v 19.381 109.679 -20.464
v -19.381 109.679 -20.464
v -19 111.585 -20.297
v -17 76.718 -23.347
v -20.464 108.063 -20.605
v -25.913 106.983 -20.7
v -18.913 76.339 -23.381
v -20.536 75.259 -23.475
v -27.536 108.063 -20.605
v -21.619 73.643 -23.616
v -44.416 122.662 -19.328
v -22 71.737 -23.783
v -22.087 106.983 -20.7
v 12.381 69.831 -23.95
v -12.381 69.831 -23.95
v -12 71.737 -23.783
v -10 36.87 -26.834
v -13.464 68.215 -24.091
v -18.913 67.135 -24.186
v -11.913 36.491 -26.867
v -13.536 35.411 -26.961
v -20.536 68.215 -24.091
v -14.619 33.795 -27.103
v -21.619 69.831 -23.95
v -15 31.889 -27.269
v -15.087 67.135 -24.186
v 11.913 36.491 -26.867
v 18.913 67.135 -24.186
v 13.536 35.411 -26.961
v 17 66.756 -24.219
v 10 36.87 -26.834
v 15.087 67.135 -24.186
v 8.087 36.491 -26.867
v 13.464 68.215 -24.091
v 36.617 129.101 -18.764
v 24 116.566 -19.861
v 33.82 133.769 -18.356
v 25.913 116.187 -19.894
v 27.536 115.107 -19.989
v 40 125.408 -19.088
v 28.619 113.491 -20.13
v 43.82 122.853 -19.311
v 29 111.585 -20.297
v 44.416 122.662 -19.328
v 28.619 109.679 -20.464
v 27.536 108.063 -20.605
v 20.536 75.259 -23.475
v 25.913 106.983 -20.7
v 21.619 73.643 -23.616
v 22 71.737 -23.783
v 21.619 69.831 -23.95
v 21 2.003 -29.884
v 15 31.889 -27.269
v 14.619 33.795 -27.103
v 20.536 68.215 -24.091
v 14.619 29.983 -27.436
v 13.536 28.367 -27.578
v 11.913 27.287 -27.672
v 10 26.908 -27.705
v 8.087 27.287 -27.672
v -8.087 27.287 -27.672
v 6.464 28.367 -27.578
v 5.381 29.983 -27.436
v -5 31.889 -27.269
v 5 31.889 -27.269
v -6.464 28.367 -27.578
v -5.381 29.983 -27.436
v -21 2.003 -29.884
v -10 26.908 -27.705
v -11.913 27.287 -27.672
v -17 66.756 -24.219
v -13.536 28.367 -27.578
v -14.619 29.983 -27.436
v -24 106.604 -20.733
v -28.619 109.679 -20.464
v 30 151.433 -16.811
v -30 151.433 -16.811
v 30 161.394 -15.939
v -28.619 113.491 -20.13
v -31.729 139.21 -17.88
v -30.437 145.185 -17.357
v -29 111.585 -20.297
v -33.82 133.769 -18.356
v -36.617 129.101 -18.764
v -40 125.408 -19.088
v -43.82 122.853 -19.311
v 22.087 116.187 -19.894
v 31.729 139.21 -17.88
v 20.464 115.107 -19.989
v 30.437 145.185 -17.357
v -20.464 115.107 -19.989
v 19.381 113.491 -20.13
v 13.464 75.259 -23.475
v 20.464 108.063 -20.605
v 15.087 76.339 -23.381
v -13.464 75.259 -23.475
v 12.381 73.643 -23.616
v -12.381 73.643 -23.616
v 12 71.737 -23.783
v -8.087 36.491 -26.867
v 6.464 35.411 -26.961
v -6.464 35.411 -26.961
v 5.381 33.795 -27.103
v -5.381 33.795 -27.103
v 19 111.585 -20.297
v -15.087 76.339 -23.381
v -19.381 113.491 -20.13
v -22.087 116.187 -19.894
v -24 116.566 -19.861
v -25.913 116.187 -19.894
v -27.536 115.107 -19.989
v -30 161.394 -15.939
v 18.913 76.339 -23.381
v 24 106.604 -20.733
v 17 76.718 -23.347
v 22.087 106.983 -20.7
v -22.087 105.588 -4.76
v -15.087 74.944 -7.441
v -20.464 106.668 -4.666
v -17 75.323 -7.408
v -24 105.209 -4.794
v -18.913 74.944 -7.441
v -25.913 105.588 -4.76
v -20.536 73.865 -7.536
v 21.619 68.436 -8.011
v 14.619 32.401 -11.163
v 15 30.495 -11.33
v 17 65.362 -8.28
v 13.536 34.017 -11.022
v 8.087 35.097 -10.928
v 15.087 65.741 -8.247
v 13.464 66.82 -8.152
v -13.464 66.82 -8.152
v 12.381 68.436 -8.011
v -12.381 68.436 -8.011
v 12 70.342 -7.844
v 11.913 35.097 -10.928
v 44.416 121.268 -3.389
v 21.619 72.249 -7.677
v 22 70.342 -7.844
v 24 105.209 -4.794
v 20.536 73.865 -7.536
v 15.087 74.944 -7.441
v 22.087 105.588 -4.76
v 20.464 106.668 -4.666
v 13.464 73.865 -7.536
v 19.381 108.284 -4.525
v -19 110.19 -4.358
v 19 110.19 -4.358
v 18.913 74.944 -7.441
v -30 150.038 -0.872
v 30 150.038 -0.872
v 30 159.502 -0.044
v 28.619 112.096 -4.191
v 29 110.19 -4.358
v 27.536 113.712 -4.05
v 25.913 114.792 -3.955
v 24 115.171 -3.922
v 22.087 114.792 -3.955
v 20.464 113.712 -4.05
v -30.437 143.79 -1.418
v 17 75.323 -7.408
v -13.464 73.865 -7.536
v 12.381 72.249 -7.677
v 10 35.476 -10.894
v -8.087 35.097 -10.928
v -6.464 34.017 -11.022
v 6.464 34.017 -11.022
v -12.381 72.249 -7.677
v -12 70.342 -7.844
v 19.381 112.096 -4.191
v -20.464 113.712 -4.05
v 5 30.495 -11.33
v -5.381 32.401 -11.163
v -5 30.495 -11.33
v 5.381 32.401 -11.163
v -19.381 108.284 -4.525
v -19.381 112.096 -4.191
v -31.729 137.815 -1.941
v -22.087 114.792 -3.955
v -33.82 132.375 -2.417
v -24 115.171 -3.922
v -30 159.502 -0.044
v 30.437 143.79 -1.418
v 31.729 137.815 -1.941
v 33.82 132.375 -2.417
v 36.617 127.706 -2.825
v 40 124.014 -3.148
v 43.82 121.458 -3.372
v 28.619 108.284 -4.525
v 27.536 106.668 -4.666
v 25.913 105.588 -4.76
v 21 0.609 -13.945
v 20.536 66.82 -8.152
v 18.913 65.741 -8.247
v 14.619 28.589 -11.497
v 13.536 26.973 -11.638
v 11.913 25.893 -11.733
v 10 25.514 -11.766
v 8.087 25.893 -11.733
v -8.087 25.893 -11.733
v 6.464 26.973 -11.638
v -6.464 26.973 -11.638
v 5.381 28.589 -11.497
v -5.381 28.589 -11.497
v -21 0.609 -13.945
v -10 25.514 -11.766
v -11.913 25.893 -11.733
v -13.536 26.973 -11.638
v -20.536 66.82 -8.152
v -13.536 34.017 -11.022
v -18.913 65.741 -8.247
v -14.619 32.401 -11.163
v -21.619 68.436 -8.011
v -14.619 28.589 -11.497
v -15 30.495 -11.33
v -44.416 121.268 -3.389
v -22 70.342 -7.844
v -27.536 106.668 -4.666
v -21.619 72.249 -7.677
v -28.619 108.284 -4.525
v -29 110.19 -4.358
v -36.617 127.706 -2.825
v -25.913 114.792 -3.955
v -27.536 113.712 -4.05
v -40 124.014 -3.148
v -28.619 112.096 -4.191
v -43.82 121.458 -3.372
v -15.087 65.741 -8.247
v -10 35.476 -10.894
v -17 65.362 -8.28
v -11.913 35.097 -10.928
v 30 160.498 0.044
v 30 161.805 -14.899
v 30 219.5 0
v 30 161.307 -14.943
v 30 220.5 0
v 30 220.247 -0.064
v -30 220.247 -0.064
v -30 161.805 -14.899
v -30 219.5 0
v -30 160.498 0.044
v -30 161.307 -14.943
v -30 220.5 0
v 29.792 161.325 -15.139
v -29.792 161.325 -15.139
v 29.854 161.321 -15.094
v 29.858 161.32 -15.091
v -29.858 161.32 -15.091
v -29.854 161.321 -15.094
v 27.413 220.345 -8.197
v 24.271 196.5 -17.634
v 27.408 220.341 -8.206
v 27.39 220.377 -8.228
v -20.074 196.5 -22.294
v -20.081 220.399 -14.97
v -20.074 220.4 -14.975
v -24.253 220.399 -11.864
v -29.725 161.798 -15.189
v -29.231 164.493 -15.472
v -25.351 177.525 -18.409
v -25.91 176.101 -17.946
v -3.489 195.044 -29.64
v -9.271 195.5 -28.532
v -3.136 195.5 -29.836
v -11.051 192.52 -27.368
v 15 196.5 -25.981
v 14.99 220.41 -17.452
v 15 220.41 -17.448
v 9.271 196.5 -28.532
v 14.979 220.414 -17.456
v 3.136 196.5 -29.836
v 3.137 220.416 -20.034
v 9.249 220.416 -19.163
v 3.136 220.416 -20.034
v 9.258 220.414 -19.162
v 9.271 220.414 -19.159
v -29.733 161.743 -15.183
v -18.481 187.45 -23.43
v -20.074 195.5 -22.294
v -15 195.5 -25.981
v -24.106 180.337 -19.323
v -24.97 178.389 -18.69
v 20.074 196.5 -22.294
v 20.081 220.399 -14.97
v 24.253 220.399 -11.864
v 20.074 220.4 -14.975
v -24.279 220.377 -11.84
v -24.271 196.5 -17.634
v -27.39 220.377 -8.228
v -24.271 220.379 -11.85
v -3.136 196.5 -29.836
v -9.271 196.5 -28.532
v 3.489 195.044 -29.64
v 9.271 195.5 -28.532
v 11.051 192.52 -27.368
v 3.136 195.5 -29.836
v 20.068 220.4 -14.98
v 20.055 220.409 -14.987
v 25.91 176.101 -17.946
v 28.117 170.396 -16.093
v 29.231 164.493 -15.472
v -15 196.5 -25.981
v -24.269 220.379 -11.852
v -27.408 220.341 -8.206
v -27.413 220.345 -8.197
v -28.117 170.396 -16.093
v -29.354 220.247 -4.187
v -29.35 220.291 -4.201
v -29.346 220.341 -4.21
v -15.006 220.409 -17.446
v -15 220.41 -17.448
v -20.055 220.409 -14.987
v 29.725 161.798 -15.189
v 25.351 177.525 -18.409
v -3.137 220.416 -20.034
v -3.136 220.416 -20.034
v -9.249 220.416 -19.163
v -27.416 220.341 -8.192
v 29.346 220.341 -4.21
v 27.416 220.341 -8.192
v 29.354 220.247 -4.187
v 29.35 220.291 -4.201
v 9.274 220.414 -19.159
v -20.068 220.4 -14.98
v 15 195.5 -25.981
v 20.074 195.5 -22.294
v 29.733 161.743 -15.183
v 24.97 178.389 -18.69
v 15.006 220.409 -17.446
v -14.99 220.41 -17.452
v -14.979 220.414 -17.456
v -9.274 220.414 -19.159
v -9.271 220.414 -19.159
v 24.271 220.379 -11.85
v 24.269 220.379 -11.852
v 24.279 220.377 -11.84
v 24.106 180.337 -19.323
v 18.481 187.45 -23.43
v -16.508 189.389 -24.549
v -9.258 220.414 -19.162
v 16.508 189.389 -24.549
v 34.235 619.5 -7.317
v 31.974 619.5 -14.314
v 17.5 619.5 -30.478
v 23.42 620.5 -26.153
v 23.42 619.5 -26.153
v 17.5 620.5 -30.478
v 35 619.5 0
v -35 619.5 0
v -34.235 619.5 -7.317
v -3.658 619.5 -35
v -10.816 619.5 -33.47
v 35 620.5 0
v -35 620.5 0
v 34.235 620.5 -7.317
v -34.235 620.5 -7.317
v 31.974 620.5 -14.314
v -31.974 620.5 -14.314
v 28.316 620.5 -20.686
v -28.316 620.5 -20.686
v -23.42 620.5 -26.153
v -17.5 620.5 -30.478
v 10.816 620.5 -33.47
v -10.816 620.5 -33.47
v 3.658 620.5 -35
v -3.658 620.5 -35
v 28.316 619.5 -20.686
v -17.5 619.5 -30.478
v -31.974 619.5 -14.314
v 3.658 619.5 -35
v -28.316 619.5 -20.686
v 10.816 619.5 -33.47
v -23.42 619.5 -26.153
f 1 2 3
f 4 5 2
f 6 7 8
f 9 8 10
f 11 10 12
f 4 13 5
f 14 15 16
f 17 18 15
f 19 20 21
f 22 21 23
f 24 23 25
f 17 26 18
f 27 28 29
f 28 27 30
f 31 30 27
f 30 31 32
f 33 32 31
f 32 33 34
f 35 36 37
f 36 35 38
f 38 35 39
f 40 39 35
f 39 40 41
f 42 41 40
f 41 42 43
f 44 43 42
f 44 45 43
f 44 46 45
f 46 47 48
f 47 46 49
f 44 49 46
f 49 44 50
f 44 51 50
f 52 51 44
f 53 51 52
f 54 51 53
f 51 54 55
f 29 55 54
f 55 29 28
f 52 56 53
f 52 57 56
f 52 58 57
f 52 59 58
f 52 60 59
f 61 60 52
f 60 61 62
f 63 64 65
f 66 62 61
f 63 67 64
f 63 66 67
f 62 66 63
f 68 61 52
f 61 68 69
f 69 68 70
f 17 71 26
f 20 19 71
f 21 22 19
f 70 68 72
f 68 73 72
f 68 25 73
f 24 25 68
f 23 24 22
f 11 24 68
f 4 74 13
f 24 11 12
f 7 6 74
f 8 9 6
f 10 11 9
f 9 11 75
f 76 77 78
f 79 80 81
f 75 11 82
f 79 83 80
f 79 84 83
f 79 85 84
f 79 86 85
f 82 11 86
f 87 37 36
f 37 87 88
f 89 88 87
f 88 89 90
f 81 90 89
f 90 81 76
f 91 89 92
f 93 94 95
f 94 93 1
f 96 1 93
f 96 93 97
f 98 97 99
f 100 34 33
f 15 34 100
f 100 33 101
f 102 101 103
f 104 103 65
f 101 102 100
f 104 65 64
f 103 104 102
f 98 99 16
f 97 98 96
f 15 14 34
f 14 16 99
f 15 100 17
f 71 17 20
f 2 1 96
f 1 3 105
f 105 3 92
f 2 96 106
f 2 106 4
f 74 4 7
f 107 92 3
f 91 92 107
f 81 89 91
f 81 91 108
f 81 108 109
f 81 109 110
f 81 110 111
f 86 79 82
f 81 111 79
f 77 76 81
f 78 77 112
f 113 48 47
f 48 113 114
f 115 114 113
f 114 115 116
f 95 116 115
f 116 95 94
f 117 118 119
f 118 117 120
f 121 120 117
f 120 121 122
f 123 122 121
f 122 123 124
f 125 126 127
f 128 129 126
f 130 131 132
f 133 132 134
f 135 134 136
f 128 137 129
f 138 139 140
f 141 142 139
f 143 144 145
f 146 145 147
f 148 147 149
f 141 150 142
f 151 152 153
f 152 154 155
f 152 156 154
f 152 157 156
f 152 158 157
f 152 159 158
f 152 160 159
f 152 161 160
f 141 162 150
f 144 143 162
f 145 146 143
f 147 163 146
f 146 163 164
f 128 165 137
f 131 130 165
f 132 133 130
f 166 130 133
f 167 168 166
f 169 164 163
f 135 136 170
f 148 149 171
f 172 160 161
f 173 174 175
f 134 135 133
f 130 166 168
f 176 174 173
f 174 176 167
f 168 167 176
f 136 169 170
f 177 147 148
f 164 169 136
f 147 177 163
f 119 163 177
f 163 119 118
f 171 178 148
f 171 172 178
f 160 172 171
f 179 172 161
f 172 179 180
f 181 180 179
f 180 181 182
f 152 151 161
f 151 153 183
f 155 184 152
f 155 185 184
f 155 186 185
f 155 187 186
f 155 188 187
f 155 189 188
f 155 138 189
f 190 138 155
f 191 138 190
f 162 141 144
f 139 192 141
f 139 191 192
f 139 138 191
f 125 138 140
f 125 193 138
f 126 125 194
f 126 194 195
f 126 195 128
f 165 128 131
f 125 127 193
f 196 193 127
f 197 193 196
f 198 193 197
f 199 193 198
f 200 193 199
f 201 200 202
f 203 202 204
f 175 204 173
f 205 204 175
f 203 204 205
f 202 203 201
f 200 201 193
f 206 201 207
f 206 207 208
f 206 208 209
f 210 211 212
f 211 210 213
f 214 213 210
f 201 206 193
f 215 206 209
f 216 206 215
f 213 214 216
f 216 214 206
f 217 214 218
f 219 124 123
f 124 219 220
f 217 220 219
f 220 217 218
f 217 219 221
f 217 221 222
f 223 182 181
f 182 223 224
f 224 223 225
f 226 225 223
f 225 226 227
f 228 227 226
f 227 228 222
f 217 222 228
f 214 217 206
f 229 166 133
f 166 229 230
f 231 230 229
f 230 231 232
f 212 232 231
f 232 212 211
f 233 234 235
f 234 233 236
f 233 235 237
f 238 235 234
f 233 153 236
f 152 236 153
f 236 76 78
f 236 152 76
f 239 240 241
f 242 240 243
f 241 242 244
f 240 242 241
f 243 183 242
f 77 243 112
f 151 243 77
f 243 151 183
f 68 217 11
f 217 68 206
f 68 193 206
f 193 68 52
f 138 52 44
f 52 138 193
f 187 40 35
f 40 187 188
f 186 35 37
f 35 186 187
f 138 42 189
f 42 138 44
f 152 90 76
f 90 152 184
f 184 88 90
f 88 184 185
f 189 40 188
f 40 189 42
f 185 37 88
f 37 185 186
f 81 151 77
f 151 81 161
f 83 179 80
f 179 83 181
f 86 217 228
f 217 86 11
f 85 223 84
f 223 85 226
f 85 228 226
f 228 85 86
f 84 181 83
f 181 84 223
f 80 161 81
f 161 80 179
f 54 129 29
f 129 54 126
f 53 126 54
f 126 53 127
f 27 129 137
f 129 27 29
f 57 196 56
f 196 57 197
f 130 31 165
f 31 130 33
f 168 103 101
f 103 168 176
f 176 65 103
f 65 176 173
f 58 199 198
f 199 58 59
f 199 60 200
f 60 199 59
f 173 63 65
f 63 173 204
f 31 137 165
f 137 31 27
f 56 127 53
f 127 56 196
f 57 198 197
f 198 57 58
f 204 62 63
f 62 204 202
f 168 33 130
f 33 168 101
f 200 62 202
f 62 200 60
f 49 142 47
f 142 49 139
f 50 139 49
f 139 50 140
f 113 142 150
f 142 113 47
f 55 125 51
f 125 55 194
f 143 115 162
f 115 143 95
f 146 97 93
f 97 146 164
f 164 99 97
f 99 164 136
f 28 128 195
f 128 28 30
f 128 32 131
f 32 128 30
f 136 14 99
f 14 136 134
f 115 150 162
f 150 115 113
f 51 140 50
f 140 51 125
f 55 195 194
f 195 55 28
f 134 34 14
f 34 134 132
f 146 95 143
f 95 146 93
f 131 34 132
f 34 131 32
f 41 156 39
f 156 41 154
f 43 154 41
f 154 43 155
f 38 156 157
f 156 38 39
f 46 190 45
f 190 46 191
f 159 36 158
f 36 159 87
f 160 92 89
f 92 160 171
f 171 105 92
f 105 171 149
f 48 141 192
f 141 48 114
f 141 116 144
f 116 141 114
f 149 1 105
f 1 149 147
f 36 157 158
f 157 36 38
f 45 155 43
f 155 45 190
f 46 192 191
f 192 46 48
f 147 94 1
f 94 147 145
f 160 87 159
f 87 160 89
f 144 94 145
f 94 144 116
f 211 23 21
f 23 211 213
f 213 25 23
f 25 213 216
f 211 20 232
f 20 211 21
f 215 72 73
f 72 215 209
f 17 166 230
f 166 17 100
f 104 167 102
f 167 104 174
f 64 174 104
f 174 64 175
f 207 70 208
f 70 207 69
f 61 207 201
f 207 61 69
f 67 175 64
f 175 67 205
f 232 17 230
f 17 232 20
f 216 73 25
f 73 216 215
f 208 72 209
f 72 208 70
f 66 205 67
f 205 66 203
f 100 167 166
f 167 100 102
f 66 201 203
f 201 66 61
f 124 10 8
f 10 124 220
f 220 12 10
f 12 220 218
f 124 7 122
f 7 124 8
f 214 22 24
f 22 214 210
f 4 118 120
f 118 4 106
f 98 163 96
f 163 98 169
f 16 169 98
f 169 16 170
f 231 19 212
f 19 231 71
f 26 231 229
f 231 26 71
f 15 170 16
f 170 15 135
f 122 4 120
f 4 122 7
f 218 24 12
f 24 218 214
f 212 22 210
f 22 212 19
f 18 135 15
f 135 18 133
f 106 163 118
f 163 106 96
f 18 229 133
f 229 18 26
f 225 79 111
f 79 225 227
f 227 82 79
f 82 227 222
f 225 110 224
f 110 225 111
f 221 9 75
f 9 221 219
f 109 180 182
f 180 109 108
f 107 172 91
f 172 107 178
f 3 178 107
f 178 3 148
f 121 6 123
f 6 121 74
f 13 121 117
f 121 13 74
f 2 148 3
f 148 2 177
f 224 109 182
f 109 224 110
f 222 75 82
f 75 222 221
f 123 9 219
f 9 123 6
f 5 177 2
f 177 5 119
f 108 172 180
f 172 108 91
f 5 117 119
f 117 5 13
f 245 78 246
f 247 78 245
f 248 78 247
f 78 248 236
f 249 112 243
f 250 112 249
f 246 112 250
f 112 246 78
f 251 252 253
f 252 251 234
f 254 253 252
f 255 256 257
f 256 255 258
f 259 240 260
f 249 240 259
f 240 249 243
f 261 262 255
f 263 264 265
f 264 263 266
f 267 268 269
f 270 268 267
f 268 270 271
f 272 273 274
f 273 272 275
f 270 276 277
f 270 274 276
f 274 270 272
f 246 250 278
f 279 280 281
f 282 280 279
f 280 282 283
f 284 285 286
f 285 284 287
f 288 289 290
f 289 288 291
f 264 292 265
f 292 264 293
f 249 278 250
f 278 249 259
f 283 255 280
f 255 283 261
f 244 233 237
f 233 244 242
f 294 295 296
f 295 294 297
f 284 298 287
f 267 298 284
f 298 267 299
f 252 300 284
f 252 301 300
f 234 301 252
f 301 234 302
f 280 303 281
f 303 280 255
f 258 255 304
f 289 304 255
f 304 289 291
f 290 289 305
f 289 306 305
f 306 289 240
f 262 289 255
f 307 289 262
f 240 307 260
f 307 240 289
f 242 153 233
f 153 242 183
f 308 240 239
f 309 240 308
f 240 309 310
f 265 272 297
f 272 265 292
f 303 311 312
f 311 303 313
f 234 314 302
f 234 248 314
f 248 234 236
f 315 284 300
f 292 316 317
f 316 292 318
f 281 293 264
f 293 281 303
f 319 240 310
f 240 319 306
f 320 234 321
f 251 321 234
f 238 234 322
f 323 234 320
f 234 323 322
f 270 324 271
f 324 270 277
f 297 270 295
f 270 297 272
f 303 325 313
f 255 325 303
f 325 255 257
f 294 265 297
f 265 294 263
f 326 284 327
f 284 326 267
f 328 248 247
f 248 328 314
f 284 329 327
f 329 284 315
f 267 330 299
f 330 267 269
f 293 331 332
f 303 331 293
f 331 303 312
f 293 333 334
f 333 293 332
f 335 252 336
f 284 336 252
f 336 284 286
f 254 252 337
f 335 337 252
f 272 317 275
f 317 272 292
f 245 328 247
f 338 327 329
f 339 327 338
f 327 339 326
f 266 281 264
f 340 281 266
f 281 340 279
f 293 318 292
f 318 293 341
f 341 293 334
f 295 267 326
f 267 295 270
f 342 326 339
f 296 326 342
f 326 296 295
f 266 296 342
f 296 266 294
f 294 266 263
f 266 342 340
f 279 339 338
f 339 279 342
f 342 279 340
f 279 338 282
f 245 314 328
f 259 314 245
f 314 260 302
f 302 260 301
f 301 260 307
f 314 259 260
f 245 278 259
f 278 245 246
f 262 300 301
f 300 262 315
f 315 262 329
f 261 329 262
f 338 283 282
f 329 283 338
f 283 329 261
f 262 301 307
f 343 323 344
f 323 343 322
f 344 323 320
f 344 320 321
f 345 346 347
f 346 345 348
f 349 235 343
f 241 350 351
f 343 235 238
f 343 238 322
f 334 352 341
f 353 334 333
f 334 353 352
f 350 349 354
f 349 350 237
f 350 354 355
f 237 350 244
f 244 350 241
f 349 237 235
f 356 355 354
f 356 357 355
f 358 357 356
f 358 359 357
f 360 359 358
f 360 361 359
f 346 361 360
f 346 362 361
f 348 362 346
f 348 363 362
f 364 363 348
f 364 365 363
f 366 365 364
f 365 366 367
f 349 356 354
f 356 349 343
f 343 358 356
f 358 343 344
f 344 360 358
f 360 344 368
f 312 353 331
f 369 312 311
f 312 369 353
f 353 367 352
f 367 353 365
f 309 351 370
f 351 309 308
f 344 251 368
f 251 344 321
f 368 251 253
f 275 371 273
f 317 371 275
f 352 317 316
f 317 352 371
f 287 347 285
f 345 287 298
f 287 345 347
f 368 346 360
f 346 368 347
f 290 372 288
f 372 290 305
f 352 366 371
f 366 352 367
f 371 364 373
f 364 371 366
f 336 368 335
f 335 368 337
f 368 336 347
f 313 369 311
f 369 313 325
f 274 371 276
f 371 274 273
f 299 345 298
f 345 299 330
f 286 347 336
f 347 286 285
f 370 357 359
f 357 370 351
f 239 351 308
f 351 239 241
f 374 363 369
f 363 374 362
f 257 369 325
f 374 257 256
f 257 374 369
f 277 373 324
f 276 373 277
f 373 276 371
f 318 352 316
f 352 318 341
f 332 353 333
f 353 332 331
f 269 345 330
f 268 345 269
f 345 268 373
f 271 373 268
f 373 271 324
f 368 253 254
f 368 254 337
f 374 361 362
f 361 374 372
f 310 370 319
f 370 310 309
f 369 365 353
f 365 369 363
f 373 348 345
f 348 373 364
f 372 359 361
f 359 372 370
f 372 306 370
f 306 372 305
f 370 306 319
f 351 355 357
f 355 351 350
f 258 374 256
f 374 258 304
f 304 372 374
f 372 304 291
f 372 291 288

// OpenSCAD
union () {
  translate ([0, 160, 0]) {
    rotate (a=5.0, v=[1, 0, 0]) {
      translate ([0, -160, 0]) {
        translate ([0, 0, -8]) {
          difference () {
            difference () {
              linear_extrude (height=16, center=true){
                polygon (points=[[-21, 0], [21, 0], [50, 150], [30, 150], [30, 170], [-30, 170], [-30, 150], [-50, 150]]);
              }
              translate ([50, 150, ]) {
                resize ([40, 60, 20]){
                  cylinder (h=20, r=20, center=true);
                }
              }
              translate ([-50, 150, ]) {
                resize ([40, 60, 20]){
                  cylinder (h=20, r=20, center=true);
                }
              }
            }
            union () {
              translate ([10, 30, ]) {
                cylinder (h=20, r=5, center=true);
              }
              translate ([17, 70, ]) {
                cylinder (h=20, r=5, center=true);
              }
              translate ([24, 110, ]) {
                cylinder (h=20, r=5, center=true);
              }
            }
            mirror ([1, 0, 0]) {
              union () {
                translate ([10, 30, ]) {
                  cylinder (h=20, r=5, center=true);
                }
                translate ([17, 70, ]) {
                  cylinder (h=20, r=5, center=true);
                }
                translate ([24, 110, ]) {
                  cylinder (h=20, r=5, center=true);
                }
              }
            }
            translate ([0, 170, 0]) {
              cube ([100, 20, 40], center=true);
            }
          }
        }
      }
    }
  }
  translate ([0, 160, 0]) {
    difference () {
      hull () {
        rotate (a=5.0, v=[1, 0, 0]) {
          translate ([0, 0, -15/2]) {
            cube ([60, 1, 15], center=true);
          }
        }
        translate ([0, 36, 0]) {
          rotate (a=-90.0, v=[1, 0, 0]) {
            difference () {
              cylinder (h=1, r=30, center=true);
              translate ([0, -30, 0]) {
                cube ([60, 60, 2], center=true);
              }
            }
          }
        }
        translate ([0, 60, 0]) {
          resize ([60, 1, 20]){
            rotate (a=-90.0, v=[1, 0, 0]) {
              difference () {
                cylinder (h=5, r=20, center=true);
                translate ([0, -20, 0]) {
                  cube ([40, 40, 20], center=true);
                }
              }
            }
          }
        }
      }
      translate ([0, 0, -65]) {
        rotate (a=90.0, v=[0, 1, 0]) {
          cylinder (h=60, r=50, center=true);
        }
      }
    }
  }
  translate ([0, 220, 0]) {
    hull () {
      translate ([0, 0, 0]) {
        resize ([60, 1, 20]){
          rotate (a=-90.0, v=[1, 0, 0]) {
            difference () {
              cylinder (h=5, r=20, center=true);
              translate ([0, -20, 0]) {
                cube ([40, 40, 20], center=true);
              }
            }
          }
        }
      }
      translate ([0, 400, 0]) {
        resize ([70, 1, 35]){
          rotate (a=-90.0, v=[1, 0, 0]) {
            difference () {
              cylinder (h=5, r=20, center=true);
              translate ([0, -20, 0]) {
                cube ([40, 40, 20], center=true);
              }
            }
          }
        }
      }
    }
  }
}
